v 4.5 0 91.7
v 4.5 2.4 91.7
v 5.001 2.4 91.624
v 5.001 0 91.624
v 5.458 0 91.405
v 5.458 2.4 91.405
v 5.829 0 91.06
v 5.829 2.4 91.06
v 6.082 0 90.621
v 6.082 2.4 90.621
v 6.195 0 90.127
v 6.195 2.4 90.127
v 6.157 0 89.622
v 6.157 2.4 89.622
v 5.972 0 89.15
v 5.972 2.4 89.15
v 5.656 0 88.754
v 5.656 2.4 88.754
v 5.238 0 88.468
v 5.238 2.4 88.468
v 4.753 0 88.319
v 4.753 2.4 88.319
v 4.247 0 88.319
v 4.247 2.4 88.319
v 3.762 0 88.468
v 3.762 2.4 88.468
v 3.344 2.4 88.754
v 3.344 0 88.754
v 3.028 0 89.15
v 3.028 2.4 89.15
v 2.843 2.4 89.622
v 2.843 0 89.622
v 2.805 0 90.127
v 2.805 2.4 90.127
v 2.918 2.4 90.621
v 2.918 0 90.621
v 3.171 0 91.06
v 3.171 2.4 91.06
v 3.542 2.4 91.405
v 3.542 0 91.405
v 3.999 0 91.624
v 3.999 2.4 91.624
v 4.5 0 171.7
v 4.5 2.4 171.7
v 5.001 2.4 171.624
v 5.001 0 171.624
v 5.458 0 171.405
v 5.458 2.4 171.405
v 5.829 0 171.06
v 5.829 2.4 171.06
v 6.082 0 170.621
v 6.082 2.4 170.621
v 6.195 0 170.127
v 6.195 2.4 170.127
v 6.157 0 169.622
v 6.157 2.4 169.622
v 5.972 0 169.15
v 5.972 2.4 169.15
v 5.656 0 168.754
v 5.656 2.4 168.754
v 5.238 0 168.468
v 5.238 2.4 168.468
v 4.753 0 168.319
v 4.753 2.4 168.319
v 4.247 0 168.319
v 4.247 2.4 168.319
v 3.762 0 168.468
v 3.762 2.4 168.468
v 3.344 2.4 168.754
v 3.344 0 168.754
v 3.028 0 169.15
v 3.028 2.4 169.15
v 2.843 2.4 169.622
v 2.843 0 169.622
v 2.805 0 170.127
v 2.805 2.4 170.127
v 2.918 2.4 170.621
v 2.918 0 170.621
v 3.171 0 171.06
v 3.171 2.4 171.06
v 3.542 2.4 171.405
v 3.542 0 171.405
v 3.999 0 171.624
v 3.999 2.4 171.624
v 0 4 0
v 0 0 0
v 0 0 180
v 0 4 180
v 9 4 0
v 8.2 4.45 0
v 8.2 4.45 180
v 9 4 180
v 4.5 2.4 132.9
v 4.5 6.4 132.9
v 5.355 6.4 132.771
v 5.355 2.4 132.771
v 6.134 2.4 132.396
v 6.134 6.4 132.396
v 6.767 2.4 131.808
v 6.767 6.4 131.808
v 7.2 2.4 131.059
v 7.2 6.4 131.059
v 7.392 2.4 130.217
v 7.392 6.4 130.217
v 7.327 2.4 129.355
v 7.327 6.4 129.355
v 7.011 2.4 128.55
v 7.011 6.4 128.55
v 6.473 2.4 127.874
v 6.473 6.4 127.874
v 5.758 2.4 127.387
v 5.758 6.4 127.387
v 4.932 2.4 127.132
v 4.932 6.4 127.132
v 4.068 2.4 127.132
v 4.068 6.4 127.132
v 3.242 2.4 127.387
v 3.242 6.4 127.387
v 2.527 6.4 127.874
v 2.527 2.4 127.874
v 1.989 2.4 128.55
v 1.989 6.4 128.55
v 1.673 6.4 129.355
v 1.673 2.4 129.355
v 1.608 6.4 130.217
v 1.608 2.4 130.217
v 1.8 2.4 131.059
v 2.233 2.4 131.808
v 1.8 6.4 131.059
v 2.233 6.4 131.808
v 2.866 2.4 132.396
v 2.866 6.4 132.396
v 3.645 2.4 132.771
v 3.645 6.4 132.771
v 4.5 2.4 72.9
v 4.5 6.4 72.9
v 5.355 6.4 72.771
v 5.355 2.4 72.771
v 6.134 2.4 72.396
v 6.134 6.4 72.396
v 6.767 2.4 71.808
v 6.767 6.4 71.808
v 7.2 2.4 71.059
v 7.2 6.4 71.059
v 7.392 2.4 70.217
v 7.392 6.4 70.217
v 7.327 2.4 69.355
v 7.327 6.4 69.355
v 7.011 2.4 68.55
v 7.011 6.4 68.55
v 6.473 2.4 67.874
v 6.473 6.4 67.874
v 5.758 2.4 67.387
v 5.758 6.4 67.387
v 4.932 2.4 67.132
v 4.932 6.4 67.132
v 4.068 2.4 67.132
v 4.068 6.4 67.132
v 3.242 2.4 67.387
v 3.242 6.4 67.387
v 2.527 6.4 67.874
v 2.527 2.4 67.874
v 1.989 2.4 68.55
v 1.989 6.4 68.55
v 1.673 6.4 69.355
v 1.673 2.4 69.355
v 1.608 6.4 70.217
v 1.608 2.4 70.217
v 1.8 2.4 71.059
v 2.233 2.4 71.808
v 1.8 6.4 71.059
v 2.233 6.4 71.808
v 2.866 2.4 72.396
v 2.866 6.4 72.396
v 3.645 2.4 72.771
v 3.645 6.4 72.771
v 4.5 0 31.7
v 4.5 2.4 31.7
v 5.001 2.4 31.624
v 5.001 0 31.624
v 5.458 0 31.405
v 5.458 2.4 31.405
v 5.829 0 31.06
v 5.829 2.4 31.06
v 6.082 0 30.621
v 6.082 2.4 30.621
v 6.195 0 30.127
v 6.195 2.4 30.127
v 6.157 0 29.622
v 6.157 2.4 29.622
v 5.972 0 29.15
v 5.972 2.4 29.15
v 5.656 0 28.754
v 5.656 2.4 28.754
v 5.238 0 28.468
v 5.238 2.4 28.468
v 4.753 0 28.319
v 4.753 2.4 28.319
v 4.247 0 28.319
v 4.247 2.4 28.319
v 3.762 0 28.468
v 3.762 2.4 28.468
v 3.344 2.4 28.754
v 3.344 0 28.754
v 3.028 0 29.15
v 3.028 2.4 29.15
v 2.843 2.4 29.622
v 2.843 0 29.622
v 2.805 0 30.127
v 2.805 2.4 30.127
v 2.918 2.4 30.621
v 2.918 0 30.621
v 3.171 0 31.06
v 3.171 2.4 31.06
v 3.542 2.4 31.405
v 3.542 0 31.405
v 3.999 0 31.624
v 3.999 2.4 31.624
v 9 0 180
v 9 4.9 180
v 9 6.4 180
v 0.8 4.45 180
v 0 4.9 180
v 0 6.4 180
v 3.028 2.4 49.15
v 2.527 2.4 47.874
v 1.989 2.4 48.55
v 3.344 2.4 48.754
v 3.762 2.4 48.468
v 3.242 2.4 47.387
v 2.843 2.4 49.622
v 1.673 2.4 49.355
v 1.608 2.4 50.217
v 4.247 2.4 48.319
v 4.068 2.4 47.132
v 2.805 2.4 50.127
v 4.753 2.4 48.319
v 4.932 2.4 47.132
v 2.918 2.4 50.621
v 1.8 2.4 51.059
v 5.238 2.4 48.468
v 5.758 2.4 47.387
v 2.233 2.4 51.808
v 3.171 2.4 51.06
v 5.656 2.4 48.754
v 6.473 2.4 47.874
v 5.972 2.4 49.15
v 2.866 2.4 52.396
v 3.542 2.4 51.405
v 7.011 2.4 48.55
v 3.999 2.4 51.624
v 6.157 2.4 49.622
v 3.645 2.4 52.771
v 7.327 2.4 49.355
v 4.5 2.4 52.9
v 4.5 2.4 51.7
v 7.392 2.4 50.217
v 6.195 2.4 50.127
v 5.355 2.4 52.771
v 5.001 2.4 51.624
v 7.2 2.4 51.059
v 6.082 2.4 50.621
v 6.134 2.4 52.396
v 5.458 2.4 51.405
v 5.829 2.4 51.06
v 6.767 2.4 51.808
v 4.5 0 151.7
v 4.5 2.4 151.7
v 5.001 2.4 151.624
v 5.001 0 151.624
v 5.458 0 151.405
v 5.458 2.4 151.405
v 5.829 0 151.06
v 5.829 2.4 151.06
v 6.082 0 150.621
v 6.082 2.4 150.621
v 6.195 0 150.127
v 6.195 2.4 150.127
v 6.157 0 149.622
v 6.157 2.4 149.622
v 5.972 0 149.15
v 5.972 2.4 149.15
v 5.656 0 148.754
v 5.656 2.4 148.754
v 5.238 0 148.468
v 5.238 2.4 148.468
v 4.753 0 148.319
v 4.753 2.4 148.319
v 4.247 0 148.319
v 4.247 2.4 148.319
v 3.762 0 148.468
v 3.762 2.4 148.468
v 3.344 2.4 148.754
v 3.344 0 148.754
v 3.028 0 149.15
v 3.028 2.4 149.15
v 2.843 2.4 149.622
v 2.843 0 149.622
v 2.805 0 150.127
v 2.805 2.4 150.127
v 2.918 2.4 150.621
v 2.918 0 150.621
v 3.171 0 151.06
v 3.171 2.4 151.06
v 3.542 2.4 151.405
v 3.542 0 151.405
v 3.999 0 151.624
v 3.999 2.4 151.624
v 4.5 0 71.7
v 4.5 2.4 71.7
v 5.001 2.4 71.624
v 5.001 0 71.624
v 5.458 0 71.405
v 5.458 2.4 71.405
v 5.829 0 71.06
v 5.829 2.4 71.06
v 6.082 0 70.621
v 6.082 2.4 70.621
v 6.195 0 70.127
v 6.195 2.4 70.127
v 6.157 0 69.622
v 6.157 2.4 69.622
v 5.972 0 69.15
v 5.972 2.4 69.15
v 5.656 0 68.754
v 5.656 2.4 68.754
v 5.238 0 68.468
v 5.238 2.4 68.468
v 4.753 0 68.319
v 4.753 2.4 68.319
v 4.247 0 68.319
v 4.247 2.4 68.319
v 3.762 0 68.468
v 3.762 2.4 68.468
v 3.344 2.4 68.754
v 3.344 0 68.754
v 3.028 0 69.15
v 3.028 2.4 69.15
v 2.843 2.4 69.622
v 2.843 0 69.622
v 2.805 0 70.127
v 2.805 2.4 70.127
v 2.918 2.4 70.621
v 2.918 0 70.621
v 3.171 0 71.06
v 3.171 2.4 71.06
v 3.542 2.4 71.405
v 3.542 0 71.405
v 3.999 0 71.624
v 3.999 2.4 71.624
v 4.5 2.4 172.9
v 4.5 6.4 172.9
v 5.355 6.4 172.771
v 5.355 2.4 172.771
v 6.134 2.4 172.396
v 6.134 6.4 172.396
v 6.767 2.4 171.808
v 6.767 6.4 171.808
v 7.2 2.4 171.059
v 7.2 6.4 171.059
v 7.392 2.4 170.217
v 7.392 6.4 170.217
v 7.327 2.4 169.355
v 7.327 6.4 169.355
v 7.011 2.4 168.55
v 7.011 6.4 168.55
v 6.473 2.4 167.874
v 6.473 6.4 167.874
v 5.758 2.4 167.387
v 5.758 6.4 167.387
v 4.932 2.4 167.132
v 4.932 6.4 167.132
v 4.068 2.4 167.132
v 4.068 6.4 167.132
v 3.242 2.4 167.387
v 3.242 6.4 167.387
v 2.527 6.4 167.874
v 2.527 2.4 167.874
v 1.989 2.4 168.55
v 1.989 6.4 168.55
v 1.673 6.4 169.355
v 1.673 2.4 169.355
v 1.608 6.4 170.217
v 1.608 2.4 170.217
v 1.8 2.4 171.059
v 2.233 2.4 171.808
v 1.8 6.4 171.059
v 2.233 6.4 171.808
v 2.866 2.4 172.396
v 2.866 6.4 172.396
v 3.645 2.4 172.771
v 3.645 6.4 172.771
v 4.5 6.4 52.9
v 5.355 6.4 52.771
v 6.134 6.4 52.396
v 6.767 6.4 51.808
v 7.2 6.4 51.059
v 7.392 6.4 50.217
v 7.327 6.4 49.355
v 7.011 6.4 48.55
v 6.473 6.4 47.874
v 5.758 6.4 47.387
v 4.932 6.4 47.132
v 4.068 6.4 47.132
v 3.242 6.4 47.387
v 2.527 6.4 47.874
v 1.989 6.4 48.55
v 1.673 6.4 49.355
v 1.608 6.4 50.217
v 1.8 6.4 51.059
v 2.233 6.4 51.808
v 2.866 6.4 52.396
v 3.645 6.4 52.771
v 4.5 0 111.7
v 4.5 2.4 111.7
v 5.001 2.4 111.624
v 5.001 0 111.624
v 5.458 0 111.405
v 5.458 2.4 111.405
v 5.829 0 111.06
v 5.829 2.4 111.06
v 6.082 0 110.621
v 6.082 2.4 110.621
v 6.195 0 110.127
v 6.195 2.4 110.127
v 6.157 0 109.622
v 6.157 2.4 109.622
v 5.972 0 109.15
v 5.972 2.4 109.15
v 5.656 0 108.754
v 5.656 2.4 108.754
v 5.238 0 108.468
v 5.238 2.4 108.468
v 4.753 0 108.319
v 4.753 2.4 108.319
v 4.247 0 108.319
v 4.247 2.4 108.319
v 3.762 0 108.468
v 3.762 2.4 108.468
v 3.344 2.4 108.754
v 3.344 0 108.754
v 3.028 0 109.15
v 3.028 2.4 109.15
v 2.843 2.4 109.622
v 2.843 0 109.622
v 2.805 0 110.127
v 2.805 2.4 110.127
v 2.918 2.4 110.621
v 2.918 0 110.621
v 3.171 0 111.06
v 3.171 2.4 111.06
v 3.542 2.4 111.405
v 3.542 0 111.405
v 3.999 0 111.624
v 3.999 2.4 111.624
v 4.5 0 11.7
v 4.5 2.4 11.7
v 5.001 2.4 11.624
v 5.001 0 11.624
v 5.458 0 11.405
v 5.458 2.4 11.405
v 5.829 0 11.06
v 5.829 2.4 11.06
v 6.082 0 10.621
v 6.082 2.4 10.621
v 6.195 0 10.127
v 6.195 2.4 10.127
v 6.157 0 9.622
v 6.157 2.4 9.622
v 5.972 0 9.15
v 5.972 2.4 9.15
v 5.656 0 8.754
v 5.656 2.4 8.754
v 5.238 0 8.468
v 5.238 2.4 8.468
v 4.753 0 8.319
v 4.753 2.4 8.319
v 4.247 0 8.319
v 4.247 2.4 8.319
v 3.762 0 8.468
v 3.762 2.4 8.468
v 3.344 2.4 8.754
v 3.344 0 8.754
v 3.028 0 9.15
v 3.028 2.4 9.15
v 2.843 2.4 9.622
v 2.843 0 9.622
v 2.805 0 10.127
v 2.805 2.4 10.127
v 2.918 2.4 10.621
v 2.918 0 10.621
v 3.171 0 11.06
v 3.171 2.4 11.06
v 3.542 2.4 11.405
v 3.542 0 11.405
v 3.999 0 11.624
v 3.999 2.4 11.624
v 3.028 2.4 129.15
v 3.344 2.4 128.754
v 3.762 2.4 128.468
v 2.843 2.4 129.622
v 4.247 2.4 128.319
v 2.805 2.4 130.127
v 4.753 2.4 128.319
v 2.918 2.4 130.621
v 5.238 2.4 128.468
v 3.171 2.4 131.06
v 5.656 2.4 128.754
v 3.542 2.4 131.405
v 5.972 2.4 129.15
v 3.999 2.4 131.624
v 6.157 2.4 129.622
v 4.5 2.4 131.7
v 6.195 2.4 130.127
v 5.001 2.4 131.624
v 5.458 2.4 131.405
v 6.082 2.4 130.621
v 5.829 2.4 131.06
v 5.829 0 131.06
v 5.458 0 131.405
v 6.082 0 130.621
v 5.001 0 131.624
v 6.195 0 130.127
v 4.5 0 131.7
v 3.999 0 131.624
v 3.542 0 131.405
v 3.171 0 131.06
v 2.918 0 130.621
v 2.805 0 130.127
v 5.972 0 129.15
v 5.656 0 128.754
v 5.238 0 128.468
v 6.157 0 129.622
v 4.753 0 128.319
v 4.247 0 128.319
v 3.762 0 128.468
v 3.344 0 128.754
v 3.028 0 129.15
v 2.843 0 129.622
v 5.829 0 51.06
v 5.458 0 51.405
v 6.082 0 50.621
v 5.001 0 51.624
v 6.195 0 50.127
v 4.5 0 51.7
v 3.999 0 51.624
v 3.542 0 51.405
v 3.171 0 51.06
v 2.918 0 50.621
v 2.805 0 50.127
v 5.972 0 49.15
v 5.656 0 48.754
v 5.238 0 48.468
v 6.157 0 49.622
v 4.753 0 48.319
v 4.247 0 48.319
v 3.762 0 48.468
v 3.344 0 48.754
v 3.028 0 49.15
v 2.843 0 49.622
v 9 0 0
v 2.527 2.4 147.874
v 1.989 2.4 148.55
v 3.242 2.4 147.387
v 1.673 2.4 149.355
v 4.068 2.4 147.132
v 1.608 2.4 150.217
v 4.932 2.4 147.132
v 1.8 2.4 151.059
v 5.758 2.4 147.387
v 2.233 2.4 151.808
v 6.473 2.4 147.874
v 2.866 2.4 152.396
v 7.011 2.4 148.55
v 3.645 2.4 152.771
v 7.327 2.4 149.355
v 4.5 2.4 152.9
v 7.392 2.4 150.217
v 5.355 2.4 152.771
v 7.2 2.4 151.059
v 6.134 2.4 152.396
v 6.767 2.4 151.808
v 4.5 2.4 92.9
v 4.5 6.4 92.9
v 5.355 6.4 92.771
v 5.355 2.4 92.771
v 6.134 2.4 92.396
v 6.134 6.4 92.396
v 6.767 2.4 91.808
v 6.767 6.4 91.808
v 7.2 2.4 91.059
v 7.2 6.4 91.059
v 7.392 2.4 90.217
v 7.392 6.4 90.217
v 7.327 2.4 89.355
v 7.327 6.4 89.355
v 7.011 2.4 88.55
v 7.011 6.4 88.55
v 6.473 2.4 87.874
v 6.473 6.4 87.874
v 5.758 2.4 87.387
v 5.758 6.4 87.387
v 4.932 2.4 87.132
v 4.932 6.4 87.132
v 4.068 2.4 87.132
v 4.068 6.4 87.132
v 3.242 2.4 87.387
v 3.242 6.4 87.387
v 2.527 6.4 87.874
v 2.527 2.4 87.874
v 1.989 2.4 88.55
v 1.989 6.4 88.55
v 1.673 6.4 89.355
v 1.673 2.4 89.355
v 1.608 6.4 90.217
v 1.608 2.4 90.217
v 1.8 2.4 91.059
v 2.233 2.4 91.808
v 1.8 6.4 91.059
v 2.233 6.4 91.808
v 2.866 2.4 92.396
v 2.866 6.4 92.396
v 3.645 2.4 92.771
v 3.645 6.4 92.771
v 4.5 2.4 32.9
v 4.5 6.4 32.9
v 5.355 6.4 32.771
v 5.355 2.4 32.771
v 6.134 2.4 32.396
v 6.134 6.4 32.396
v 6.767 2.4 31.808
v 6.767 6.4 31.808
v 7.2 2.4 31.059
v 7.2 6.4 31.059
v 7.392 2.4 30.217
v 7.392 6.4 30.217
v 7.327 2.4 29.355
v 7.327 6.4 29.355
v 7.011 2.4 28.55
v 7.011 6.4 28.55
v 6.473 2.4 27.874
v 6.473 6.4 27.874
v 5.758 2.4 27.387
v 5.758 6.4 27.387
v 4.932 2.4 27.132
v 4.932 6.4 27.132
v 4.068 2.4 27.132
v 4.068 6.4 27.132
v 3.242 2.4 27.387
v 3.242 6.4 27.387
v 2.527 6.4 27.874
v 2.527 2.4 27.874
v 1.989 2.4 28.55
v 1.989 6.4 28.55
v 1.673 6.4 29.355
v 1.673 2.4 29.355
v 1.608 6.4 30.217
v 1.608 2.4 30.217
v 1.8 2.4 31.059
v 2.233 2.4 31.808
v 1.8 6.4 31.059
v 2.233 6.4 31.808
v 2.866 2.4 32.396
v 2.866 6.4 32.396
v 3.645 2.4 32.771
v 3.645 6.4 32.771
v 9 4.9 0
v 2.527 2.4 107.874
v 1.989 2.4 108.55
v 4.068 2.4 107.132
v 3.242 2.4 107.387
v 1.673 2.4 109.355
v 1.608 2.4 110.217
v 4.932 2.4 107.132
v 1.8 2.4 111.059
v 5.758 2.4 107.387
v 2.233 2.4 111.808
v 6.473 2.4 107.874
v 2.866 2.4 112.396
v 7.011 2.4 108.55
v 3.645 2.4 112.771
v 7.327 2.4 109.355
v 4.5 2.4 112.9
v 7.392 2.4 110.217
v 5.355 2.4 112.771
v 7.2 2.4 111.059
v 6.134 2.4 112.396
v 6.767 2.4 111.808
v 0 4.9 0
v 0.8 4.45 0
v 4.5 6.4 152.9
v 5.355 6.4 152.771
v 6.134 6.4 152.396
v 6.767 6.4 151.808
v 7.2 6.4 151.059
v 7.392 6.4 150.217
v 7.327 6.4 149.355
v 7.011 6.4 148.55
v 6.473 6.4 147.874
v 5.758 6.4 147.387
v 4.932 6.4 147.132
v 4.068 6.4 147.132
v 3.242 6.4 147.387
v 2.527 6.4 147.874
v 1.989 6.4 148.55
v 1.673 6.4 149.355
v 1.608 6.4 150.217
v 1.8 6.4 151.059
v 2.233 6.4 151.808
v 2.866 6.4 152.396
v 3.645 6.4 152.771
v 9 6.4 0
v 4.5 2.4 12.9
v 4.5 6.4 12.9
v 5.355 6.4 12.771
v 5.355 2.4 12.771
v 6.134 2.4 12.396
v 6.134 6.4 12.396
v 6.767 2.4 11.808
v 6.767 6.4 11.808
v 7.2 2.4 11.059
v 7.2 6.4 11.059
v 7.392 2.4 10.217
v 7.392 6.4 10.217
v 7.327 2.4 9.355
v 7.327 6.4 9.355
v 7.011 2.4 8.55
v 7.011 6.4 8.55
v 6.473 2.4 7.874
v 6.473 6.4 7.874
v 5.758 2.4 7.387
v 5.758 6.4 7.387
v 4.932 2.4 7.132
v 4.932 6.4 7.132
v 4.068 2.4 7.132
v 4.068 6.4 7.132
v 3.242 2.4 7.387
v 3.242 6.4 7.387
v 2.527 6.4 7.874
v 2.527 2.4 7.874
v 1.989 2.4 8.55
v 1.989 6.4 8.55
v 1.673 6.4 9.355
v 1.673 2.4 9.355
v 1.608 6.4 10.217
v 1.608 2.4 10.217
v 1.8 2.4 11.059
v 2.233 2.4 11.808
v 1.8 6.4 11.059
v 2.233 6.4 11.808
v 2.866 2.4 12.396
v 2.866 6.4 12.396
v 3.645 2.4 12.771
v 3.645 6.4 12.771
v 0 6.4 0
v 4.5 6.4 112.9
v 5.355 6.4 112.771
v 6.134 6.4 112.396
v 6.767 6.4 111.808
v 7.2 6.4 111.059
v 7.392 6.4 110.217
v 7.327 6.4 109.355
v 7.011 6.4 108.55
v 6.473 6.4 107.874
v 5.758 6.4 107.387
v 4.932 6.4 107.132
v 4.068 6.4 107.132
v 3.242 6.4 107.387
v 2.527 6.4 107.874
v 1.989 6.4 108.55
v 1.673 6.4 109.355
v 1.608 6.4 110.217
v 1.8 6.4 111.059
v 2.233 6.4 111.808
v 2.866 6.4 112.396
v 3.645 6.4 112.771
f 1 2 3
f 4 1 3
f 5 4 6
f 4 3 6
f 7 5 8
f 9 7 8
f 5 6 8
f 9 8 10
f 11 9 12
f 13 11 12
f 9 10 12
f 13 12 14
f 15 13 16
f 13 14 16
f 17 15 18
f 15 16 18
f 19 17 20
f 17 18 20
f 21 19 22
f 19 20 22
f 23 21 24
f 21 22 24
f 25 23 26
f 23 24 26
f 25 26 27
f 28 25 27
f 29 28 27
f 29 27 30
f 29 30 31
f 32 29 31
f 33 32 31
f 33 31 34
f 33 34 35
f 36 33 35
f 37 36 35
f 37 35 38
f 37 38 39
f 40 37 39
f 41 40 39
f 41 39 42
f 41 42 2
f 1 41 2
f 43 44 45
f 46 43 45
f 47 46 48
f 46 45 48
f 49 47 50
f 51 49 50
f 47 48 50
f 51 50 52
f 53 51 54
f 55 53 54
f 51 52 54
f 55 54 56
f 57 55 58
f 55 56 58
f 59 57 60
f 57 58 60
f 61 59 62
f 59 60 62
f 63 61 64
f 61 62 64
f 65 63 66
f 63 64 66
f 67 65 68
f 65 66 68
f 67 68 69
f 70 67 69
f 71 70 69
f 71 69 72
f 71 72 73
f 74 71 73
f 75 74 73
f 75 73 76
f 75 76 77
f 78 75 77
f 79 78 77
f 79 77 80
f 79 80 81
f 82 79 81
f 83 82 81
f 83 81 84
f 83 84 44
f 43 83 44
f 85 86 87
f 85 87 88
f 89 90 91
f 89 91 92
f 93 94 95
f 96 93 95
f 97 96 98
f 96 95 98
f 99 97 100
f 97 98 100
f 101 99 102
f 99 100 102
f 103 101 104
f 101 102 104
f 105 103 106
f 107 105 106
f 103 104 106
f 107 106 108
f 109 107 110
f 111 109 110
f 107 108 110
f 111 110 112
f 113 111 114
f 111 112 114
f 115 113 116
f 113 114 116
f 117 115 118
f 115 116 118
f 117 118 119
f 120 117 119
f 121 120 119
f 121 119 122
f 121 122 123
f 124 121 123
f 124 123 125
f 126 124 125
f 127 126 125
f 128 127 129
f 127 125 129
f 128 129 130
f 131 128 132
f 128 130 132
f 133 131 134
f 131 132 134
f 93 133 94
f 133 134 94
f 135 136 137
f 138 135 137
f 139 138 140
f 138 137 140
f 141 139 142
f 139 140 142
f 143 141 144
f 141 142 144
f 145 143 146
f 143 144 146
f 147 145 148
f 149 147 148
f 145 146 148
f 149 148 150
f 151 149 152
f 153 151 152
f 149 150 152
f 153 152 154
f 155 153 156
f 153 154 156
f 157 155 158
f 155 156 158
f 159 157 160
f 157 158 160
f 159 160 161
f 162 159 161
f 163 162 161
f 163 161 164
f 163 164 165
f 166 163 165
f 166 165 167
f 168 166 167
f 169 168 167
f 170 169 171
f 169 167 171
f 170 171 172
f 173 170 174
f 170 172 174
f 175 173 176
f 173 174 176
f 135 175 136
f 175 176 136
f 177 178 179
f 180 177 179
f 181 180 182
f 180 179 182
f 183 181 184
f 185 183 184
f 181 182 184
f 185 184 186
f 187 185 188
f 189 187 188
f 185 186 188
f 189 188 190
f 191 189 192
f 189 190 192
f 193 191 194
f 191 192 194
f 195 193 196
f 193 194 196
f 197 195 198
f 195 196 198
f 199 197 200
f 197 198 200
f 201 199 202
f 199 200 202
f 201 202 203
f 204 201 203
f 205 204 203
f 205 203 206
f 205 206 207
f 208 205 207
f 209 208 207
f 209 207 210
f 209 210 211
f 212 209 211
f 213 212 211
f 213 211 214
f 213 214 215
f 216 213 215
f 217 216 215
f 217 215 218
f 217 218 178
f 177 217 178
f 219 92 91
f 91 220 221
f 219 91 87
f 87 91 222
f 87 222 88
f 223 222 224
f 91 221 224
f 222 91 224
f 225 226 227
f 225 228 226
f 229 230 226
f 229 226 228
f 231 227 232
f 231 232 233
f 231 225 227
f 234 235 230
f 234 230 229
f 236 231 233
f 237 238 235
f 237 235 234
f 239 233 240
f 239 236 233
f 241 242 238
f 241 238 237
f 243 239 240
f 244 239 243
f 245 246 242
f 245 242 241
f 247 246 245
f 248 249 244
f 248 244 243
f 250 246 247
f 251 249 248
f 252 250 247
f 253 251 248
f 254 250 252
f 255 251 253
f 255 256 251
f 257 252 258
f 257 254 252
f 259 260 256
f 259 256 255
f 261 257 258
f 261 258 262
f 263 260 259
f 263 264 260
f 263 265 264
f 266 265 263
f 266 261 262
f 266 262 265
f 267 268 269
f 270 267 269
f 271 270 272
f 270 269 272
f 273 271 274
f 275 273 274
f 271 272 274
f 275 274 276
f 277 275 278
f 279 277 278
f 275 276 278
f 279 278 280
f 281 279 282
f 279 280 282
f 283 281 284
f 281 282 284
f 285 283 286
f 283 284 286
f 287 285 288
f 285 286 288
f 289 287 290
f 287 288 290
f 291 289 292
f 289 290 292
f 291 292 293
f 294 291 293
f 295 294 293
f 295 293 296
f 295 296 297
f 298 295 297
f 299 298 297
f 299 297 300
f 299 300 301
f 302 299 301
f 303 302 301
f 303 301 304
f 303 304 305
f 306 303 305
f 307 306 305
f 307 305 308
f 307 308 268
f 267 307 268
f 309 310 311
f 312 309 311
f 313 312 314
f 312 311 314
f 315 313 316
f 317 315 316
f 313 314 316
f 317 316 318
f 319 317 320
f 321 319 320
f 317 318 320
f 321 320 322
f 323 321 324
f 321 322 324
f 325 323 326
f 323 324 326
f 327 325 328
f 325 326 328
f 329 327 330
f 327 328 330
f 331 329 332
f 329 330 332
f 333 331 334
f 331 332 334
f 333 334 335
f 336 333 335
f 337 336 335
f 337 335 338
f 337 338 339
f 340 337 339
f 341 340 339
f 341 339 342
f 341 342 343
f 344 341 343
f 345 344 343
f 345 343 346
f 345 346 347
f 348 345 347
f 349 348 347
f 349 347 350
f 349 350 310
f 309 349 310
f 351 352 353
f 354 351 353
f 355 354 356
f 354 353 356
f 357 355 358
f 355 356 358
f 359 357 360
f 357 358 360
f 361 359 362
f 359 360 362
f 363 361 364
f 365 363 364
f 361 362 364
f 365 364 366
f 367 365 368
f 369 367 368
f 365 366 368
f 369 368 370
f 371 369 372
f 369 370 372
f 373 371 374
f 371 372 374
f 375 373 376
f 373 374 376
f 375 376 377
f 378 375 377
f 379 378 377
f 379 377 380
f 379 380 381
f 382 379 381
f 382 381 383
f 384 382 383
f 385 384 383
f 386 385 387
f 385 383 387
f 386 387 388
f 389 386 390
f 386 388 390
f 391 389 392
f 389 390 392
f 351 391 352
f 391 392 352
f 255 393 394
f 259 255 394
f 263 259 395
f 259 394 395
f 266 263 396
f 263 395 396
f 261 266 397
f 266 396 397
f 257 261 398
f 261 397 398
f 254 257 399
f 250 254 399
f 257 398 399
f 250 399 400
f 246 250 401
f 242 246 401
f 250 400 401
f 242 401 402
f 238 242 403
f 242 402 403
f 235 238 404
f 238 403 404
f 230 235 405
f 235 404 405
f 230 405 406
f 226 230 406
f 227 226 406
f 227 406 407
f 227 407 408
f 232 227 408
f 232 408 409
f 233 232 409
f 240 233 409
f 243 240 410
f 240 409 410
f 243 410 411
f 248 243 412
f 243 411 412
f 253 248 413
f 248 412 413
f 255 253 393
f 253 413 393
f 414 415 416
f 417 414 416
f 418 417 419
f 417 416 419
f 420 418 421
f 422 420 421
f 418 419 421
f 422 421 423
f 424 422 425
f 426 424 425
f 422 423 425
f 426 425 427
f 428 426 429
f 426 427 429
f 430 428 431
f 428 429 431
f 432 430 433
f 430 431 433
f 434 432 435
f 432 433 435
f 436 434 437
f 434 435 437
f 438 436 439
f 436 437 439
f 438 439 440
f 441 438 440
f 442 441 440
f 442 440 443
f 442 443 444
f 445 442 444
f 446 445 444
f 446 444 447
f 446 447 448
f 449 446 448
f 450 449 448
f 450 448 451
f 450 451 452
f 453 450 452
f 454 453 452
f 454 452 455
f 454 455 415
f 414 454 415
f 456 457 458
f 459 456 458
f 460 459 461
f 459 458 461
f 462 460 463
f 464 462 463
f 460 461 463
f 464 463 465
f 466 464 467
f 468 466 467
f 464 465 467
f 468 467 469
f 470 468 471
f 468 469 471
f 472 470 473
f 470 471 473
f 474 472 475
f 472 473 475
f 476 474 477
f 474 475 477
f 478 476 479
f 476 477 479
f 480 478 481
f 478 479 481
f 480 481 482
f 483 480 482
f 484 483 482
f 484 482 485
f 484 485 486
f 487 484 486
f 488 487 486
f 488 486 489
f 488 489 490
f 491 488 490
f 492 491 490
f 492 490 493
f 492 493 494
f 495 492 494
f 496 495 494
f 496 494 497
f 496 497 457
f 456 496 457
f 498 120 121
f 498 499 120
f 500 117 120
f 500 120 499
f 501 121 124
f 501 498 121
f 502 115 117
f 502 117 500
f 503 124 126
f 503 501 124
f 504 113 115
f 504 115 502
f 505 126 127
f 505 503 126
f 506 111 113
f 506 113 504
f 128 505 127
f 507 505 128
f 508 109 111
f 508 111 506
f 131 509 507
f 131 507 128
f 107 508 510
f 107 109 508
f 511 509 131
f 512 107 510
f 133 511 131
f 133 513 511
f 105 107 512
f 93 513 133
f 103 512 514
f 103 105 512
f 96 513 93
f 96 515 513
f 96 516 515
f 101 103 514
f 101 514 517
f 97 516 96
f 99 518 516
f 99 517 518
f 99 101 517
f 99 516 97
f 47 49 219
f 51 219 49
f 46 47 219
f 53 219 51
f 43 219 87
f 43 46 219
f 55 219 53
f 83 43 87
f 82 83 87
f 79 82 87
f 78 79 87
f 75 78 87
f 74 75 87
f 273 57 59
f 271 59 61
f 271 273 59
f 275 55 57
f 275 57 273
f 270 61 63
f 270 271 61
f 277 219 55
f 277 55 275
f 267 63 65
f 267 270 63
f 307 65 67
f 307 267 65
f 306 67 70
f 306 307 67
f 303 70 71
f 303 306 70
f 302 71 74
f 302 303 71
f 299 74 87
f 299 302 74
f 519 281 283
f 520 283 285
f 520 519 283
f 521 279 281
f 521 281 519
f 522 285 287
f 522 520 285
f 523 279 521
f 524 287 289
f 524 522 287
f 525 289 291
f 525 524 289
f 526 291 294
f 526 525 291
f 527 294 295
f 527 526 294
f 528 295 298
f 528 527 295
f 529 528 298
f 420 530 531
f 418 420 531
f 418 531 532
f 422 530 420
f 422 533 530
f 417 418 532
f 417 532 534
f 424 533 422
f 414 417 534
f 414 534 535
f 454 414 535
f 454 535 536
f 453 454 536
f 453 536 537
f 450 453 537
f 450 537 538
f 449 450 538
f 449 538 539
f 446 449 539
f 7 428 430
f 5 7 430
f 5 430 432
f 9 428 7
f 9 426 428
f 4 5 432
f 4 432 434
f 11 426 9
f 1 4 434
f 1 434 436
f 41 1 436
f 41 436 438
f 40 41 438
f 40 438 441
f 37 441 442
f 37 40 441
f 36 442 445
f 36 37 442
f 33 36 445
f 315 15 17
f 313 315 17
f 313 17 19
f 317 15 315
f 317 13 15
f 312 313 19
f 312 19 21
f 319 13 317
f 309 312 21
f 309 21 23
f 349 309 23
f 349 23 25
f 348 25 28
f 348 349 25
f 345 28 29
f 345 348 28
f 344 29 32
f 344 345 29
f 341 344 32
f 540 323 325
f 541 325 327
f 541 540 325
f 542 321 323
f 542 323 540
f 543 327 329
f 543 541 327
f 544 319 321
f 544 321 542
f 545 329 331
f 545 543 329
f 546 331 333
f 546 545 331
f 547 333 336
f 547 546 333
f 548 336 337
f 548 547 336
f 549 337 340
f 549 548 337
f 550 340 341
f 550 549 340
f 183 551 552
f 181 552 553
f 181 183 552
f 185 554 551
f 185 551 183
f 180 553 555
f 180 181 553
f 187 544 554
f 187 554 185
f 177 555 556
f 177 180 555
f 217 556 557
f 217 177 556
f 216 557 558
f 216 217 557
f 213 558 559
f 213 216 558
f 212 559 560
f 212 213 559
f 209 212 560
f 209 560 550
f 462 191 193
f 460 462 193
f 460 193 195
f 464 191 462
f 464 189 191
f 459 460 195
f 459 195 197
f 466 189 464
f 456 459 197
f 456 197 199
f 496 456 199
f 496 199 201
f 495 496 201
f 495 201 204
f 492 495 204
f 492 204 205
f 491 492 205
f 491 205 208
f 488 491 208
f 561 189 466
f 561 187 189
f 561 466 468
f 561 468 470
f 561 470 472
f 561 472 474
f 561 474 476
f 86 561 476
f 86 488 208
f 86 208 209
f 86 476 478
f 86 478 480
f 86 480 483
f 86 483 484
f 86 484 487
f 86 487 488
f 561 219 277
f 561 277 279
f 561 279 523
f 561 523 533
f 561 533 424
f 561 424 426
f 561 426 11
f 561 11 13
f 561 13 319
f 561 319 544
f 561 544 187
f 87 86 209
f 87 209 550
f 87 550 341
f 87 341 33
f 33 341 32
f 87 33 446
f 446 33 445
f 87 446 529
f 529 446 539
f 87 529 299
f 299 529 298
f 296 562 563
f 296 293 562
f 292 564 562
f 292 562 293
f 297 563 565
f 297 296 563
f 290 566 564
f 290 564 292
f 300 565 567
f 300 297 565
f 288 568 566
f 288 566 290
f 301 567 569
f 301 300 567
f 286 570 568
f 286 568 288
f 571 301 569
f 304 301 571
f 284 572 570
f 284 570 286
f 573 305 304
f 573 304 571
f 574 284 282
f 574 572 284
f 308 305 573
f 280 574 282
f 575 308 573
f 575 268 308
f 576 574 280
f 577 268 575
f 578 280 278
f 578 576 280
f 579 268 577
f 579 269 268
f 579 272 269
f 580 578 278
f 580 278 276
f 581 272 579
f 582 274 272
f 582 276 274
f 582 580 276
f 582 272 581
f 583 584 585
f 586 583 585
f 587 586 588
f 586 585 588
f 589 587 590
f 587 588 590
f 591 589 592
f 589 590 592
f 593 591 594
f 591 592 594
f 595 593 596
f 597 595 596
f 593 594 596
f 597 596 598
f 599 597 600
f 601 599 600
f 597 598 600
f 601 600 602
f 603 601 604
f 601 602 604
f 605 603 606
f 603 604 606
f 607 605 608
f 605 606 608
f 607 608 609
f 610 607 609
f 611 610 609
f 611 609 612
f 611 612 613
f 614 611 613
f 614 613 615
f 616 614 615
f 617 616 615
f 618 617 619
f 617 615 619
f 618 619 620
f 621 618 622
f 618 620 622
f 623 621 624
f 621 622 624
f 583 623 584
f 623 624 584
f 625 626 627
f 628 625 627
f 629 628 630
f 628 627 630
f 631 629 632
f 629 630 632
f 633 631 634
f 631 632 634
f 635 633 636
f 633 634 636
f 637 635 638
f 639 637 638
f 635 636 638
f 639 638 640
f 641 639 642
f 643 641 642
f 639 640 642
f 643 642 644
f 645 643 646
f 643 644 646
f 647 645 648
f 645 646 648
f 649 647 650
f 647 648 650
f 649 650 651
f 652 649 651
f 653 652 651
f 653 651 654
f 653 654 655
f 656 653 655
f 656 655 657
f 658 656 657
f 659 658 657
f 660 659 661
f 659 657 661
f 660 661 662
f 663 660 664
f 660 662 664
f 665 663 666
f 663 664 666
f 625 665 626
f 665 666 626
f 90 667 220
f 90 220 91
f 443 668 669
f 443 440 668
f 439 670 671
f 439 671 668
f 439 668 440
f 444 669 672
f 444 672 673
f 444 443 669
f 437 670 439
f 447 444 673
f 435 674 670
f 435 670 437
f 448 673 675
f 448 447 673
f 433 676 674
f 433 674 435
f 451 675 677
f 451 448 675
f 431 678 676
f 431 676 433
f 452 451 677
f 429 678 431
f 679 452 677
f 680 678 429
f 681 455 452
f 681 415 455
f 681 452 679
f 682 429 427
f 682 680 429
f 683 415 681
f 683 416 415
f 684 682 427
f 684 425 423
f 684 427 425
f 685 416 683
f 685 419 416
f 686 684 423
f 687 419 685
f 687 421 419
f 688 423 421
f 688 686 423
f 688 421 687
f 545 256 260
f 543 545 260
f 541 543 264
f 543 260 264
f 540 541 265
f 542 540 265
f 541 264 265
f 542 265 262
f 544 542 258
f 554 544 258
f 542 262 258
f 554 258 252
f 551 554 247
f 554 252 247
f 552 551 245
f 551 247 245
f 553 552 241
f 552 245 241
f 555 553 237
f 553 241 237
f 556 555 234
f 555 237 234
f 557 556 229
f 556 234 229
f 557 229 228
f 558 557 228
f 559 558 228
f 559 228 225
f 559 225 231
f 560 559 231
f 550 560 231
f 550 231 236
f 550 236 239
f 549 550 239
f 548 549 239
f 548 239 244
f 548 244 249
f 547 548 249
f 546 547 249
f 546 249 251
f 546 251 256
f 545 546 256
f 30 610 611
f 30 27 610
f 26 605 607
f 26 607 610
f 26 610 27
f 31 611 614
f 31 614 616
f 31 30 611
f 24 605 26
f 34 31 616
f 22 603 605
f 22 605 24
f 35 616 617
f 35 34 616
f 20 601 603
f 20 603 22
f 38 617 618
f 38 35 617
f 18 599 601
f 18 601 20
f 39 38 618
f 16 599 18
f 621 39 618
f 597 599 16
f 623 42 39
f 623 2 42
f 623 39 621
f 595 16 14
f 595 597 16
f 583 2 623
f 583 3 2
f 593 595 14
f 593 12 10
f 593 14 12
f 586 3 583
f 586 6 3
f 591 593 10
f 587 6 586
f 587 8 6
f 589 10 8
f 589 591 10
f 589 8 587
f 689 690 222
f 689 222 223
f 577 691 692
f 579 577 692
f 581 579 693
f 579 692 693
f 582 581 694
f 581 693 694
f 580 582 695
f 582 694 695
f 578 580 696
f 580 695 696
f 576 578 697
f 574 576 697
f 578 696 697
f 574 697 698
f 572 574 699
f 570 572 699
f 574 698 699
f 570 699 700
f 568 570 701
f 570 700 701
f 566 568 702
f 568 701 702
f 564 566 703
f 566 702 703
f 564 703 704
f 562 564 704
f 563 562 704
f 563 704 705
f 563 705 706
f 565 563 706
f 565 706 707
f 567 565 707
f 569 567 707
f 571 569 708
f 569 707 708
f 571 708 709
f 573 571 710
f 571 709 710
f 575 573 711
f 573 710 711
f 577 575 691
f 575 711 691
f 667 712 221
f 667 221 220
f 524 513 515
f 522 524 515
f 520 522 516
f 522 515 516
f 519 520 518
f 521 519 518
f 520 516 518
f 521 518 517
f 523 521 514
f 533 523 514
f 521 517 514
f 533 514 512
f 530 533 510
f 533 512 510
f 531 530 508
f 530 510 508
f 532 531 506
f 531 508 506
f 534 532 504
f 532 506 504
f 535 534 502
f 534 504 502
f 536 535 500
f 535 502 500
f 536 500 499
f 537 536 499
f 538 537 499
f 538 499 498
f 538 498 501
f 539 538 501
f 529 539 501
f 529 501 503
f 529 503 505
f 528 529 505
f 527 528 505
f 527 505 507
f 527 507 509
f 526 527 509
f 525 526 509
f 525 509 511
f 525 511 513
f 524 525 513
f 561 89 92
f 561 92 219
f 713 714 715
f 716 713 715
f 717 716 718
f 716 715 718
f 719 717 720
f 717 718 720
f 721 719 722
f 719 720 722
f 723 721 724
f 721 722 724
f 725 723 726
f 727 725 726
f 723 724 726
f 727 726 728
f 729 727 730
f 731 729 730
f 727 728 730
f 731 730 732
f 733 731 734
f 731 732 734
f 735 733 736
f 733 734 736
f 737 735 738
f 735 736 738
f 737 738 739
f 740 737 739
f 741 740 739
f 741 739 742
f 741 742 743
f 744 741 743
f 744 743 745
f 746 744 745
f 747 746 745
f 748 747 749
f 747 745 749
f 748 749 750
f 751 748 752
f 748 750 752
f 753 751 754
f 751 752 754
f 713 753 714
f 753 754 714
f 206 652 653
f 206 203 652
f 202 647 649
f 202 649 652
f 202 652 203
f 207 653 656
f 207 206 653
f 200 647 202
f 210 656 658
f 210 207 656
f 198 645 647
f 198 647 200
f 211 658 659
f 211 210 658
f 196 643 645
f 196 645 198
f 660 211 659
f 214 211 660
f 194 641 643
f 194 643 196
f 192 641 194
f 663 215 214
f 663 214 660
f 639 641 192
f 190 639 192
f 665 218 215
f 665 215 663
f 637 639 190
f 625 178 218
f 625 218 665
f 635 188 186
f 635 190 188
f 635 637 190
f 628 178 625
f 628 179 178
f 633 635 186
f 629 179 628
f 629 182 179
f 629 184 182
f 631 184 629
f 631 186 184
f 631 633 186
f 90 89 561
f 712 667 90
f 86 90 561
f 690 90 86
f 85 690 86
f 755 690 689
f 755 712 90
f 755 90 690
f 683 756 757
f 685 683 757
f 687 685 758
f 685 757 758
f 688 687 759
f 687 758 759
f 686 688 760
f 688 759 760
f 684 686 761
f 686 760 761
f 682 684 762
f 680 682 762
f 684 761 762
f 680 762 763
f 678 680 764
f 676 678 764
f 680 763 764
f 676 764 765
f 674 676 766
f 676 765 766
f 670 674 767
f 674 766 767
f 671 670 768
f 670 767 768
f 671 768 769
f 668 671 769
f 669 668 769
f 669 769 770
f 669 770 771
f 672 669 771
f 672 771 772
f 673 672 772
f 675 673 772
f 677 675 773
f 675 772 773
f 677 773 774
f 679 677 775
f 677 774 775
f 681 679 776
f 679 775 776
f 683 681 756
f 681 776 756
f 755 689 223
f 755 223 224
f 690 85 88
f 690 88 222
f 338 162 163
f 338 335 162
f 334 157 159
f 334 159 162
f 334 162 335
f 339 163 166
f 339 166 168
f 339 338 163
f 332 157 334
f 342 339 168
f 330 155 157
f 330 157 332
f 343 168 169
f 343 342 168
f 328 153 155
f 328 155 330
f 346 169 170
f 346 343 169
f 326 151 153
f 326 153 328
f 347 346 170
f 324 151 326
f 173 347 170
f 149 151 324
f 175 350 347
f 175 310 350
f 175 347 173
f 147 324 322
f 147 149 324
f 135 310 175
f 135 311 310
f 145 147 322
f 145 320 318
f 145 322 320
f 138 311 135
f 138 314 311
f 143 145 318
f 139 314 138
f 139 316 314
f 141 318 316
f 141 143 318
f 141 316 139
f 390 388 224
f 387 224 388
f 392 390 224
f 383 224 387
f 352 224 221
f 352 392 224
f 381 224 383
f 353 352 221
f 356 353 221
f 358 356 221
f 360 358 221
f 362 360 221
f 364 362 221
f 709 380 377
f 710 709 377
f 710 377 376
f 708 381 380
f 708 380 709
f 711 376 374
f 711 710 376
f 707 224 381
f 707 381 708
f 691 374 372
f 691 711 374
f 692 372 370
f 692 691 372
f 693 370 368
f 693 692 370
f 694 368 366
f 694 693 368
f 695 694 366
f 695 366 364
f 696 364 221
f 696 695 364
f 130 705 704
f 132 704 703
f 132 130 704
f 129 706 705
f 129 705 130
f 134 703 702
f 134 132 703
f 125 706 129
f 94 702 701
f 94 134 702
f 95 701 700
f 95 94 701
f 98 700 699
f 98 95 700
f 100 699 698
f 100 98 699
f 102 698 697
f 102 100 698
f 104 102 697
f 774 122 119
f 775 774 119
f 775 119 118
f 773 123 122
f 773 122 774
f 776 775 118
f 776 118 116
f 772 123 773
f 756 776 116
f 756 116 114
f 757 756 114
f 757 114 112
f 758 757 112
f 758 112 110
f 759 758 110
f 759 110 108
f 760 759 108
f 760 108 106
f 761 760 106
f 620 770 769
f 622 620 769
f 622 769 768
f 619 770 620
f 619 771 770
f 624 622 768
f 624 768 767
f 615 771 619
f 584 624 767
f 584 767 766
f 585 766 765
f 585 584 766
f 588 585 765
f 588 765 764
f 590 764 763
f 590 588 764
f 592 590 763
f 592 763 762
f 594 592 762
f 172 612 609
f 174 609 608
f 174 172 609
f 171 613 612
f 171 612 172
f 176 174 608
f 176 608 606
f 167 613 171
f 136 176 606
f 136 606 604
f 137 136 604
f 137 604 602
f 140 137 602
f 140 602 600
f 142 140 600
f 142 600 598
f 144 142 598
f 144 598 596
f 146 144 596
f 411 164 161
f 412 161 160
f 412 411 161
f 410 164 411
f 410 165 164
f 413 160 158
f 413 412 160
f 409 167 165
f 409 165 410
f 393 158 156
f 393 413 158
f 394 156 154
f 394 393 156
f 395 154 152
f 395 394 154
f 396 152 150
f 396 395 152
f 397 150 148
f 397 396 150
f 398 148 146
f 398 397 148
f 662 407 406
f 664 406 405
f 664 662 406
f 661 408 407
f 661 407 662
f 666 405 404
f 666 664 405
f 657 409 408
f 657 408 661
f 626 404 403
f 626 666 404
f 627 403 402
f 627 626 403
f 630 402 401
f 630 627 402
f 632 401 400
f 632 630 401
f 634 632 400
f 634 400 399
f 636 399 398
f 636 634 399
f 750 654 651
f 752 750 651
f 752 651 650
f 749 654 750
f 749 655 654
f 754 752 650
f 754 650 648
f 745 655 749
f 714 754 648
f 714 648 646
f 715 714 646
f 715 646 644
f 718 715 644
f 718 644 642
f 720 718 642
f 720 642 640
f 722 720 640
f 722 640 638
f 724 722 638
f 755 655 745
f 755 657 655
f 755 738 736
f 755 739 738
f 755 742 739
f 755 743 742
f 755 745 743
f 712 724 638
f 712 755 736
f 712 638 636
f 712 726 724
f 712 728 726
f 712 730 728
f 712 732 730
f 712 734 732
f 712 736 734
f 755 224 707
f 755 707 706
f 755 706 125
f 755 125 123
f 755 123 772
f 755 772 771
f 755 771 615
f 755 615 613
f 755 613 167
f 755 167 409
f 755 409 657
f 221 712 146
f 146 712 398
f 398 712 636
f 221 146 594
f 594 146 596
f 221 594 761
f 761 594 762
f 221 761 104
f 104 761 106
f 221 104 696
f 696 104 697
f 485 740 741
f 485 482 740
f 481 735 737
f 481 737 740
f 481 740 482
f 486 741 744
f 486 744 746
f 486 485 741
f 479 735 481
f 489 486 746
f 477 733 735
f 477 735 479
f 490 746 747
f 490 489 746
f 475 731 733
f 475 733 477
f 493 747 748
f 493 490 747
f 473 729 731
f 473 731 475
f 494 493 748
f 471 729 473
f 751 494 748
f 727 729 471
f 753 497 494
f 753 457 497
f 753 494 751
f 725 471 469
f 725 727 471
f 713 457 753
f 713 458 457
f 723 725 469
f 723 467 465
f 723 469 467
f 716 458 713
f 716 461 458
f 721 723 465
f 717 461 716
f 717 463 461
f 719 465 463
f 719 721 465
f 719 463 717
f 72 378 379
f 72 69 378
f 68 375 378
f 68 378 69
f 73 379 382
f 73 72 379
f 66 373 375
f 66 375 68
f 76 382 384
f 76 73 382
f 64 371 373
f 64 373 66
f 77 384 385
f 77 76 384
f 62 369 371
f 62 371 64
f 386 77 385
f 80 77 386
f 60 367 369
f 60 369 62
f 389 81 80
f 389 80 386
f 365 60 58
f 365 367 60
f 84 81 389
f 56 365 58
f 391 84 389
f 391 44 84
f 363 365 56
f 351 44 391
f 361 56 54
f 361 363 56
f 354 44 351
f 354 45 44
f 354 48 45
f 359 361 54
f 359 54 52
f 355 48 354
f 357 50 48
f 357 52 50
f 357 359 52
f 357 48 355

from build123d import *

# Parameters (mm, degrees)
BOSS_EXTRUDE1_DEPTH = 180
SKETCH2_R           = 2.9
CUT_EXTRUDE1_DEPTH  = 4
SKETCH3_R           = 1.7
CUT_EXTRUDE2_DEPTH  = 181.269243078


with BuildPart() as part:
    # Sketch1 → Boss-Extrude1 (new body)
    with BuildSketch(Plane.XY):
        Polygon((9, 6.4), (9, 4.9), (8.2, 4.45), (9, 4), (9, 0), (0, 0), (0, 4), (0.8, 4.45), (0, 4.9), (0, 6.4), align=None)
    extrude(amount=BOSS_EXTRUDE1_DEPTH)

    # Sketch2 → Cut-Extrude1 (cut)
    with BuildSketch(Plane(origin=(0, 6.4, 0), x_dir=(1, 0, 0), z_dir=(0, 1, 0))):
        with Locations(Location((4.5, -170, 0), (0, 0, 270))):
            Circle(SKETCH2_R)
        with Locations(Location((4.5, -150, 0), (0, 0, 270))):
            Circle(SKETCH2_R)
        with Locations(Location((4.5, -130, 0), (0, 0, 270))):
            Circle(SKETCH2_R)
        with Locations(Location((4.5, -110, 0), (0, 0, 270))):
            Circle(SKETCH2_R)
        with Locations(Location((4.5, -90, 0), (0, 0, 270))):
            Circle(SKETCH2_R)
        with Locations(Location((4.5, -70, 0), (0, 0, 270))):
            Circle(SKETCH2_R)
        with Locations(Location((4.5, -50, 0), (0, 0, 270))):
            Circle(SKETCH2_R)
        with Locations(Location((4.5, -30, 0), (0, 0, 270))):
            Circle(SKETCH2_R)
        with Locations(Location((4.5, -10, 0), (0, 0, 270))):
            Circle(SKETCH2_R)
    extrude(amount=-CUT_EXTRUDE1_DEPTH, mode=Mode.SUBTRACT)

    # Sketch3 → Cut-Extrude2 (cut, through all)
    with BuildSketch(Plane(origin=(0, 2.4, 0), x_dir=(1, 0, 0), z_dir=(0, 1, 0))):
        with Locations(Location((4.5, -170, 0), (0, 0, 270))):
            Circle(SKETCH3_R)
        with Locations(Location((4.5, -150, 0), (0, 0, 270))):
            Circle(SKETCH3_R)
        with Locations(Location((4.5, -130, 0), (0, 0, 270))):
            Circle(SKETCH3_R)
        with Locations(Location((4.5, -110, 0), (0, 0, 270))):
            Circle(SKETCH3_R)
        with Locations(Location((4.5, -90, 0), (0, 0, 270))):
            Circle(SKETCH3_R)
        with Locations(Location((4.5, -70, 0), (0, 0, 270))):
            Circle(SKETCH3_R)
        with Locations(Location((4.5, -50, 0), (0, 0, 270))):
            Circle(SKETCH3_R)
        with Locations(Location((4.5, -30, 0), (0, 0, 270))):
            Circle(SKETCH3_R)
        with Locations(Location((4.5, -10, 0), (0, 0, 270))):
            Circle(SKETCH3_R)
    extrude(amount=-CUT_EXTRUDE2_DEPTH, mode=Mode.SUBTRACT)


solid = part.part
